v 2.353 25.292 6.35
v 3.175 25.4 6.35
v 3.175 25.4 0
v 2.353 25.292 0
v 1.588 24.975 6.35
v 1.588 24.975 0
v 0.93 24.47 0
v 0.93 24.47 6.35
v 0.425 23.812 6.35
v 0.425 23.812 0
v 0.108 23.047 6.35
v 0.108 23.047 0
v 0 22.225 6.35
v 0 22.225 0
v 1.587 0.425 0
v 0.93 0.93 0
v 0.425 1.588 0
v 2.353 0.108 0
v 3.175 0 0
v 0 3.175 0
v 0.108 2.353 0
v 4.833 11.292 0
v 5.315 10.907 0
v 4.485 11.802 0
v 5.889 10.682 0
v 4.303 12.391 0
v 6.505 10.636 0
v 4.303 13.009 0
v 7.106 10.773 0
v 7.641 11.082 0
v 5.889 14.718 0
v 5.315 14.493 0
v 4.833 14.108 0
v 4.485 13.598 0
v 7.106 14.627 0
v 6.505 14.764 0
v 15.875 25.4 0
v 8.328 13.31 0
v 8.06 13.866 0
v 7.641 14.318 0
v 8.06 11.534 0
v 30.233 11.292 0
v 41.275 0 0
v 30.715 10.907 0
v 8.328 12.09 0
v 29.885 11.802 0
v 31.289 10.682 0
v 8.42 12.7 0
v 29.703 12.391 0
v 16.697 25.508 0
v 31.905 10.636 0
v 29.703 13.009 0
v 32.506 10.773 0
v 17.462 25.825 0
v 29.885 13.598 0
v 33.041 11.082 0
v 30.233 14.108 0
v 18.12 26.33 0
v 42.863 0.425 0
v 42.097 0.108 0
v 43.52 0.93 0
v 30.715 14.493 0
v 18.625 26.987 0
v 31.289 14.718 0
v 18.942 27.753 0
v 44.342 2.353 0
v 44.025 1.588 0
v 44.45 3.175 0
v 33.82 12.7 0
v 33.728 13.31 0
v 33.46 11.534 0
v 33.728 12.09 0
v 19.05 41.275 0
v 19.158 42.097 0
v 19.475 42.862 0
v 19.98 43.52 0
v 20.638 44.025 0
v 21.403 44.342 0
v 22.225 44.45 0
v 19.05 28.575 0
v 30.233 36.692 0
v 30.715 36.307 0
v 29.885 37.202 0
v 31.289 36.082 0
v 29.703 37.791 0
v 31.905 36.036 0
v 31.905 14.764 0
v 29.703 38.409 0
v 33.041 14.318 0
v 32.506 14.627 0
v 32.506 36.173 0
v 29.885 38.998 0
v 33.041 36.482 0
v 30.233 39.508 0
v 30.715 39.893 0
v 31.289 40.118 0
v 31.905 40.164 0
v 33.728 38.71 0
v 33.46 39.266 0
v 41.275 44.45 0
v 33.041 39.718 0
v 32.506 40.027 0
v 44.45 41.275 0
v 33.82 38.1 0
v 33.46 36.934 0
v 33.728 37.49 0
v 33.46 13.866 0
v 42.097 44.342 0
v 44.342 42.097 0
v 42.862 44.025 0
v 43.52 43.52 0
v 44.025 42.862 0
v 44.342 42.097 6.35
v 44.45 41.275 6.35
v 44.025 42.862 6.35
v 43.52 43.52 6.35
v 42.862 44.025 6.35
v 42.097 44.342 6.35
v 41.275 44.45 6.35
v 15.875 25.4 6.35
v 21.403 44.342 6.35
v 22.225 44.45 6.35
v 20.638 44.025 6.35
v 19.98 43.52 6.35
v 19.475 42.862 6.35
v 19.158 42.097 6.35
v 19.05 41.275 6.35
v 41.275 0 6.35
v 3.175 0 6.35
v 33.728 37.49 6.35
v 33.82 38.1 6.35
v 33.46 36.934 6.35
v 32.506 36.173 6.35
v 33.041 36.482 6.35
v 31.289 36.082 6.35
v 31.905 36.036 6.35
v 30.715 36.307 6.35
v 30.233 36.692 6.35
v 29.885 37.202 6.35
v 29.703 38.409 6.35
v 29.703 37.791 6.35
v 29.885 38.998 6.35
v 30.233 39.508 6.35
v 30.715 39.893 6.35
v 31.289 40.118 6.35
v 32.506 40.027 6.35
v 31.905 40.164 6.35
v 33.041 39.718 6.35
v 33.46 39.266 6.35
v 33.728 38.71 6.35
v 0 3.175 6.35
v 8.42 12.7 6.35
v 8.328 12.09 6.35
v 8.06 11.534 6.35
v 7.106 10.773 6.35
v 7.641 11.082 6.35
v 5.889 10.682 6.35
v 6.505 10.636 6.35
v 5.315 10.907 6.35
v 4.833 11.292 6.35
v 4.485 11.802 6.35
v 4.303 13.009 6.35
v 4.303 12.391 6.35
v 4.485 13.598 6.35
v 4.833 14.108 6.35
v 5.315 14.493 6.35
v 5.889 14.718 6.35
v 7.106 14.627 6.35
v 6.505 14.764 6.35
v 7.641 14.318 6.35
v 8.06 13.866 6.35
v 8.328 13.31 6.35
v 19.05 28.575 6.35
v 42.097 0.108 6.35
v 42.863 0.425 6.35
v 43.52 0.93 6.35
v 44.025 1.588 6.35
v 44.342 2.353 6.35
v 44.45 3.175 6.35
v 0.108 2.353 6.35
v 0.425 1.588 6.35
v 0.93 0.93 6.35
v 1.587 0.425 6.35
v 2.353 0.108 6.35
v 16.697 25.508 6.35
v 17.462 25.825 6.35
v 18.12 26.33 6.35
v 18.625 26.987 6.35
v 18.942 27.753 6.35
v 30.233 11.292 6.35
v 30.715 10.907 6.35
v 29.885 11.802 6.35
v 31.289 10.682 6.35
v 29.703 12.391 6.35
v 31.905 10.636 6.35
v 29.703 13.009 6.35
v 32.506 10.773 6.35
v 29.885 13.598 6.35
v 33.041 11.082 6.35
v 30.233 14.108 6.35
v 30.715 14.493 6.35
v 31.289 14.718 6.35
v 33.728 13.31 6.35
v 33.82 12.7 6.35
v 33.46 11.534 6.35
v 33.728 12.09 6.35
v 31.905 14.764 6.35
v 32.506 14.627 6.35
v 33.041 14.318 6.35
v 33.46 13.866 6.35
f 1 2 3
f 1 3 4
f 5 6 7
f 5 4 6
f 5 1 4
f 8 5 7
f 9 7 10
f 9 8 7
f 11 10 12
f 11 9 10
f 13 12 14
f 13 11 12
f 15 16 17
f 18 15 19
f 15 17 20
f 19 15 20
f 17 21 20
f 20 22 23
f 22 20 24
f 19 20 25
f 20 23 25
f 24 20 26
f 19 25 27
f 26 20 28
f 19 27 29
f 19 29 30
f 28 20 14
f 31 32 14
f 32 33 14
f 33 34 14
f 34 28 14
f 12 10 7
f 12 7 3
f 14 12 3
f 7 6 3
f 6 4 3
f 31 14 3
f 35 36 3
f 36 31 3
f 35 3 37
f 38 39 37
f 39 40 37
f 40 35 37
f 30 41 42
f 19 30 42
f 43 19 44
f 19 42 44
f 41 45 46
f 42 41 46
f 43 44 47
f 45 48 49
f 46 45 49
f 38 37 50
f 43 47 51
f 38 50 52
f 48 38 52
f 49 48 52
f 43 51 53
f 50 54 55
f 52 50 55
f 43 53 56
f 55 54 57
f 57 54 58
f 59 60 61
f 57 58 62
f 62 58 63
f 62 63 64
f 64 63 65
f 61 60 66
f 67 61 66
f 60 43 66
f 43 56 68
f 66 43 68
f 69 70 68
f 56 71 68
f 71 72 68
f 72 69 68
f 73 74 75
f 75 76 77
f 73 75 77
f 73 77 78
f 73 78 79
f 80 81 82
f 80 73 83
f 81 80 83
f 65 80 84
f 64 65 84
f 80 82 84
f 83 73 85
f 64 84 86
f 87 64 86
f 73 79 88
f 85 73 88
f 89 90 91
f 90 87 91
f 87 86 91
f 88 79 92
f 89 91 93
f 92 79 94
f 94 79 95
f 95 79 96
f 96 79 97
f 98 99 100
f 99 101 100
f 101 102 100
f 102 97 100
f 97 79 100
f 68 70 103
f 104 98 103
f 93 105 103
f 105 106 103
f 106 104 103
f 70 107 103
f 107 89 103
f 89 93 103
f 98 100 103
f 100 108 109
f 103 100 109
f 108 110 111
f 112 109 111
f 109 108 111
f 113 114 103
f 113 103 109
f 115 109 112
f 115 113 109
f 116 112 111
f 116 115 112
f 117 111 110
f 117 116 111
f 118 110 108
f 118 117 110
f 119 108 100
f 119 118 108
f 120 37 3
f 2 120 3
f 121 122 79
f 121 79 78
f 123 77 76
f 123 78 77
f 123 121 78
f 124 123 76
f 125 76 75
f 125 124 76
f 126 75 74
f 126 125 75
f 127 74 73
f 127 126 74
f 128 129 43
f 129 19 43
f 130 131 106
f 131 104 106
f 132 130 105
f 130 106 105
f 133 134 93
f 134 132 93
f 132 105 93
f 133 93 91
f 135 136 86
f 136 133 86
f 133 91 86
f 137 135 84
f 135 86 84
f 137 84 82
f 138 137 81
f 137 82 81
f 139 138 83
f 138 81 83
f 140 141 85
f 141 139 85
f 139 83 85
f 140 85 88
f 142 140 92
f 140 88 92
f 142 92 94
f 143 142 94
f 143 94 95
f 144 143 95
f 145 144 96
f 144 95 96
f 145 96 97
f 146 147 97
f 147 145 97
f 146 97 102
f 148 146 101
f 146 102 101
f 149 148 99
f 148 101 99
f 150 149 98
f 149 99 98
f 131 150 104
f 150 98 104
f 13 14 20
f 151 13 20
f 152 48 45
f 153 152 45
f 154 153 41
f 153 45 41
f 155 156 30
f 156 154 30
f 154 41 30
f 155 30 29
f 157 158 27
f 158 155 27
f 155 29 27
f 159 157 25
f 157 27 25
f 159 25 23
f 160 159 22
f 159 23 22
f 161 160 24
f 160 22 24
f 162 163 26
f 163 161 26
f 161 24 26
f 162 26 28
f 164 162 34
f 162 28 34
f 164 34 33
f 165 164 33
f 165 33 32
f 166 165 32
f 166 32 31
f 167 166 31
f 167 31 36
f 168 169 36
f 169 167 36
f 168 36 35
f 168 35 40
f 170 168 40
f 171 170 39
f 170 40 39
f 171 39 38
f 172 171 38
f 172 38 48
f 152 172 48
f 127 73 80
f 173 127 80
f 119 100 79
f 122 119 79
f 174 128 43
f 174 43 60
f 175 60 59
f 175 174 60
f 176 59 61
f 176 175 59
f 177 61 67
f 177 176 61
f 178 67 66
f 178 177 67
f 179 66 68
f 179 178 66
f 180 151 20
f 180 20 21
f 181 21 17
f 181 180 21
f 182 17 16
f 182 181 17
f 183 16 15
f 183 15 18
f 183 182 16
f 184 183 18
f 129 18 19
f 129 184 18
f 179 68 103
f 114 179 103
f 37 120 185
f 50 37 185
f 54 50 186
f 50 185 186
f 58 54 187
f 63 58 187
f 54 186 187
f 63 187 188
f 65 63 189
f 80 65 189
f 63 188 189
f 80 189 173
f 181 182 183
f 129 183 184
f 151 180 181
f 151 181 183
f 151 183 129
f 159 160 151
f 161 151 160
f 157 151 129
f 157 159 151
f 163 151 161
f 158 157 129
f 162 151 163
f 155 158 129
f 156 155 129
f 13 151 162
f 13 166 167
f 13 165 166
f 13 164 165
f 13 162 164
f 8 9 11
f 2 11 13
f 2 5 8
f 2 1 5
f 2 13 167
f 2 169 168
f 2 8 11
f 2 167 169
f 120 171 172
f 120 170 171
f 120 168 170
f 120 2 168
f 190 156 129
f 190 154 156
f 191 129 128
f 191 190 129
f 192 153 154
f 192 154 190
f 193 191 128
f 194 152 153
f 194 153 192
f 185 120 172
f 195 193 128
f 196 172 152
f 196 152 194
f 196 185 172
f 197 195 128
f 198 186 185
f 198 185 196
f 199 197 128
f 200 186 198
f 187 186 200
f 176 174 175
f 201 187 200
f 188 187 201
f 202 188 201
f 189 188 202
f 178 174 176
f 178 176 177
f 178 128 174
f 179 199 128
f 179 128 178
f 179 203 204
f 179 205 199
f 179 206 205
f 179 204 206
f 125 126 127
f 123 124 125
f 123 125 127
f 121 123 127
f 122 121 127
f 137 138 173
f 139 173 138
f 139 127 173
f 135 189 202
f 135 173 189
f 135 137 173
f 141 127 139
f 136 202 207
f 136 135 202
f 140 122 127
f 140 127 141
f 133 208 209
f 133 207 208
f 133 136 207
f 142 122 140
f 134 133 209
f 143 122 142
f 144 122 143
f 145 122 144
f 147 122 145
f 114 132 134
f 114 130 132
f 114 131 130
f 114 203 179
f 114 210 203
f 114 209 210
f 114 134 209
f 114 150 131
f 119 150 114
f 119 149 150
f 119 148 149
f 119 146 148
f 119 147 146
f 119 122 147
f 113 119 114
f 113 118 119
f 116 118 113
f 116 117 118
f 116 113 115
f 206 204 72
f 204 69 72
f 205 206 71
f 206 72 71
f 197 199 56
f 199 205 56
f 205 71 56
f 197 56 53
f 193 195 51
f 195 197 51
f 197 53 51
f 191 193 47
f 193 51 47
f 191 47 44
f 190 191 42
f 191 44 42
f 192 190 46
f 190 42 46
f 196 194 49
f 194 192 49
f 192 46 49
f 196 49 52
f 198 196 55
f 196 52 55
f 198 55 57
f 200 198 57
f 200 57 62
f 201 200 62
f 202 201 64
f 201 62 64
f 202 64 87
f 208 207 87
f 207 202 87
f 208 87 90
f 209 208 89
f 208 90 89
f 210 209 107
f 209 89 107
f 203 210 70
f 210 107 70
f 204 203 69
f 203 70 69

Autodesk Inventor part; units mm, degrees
ref_plane "YZ Plane" through (0, 0, 0) normal (1, 0, 0) x (0, 1, 0)
ref_plane "XZ Plane" through (0, 0, 0) normal (0, 1, 0) x (-1, 0, 0)
ref_plane "XY Plane" through (0, 0, 0) normal (0, 0, 1) x (1, 0, 0)
sketch "Sketch1" plane through (0, 0, 0) normal (0, 0, 1) x (1, 0, 0)
  line L0 (0, 0) -> (44.45, 0)
  line L1 (44.45, 0) -> (44.45, 44.45)
  line L2 (44.45, 44.45) -> (19.05, 44.45)
  line L3 (19.05, 44.45) -> (19.05, 25.4)
  line L4 (19.05, 25.4) -> (0, 25.4)
  line L5 (0, 25.4) -> (0, 0)
  circle A0 centre (6.35, 12.7) radius 2.0701
  circle A1 centre (31.75, 12.7) radius 2.0701
  circle A2 centre (31.75, 38.1) radius 2.0701
  dimension "d0" = 44.45
  dimension "d1" = 25.4
  dimension "d2" = 4.1402
  dimension "d3" = 12.7
  dimension "d4" = 6.35
  dimension "d7" = 25.4
  dimension "d14" = 25.4
extrude "Extrusion1" add sketch "Sketch1" along normal blind 6.35
fillet "Fillet1" radius 3.175 6 edges at (19.05, 25.4, 3.175) (0, 25.4, 3.175) (0, 0, 3.175) (44.45, 0, 3.175) (44.45, 44.45, 3.175) (19.05, 44.45, 3.175)
properties part number "Spacer 2" material "ABS Plastic"
